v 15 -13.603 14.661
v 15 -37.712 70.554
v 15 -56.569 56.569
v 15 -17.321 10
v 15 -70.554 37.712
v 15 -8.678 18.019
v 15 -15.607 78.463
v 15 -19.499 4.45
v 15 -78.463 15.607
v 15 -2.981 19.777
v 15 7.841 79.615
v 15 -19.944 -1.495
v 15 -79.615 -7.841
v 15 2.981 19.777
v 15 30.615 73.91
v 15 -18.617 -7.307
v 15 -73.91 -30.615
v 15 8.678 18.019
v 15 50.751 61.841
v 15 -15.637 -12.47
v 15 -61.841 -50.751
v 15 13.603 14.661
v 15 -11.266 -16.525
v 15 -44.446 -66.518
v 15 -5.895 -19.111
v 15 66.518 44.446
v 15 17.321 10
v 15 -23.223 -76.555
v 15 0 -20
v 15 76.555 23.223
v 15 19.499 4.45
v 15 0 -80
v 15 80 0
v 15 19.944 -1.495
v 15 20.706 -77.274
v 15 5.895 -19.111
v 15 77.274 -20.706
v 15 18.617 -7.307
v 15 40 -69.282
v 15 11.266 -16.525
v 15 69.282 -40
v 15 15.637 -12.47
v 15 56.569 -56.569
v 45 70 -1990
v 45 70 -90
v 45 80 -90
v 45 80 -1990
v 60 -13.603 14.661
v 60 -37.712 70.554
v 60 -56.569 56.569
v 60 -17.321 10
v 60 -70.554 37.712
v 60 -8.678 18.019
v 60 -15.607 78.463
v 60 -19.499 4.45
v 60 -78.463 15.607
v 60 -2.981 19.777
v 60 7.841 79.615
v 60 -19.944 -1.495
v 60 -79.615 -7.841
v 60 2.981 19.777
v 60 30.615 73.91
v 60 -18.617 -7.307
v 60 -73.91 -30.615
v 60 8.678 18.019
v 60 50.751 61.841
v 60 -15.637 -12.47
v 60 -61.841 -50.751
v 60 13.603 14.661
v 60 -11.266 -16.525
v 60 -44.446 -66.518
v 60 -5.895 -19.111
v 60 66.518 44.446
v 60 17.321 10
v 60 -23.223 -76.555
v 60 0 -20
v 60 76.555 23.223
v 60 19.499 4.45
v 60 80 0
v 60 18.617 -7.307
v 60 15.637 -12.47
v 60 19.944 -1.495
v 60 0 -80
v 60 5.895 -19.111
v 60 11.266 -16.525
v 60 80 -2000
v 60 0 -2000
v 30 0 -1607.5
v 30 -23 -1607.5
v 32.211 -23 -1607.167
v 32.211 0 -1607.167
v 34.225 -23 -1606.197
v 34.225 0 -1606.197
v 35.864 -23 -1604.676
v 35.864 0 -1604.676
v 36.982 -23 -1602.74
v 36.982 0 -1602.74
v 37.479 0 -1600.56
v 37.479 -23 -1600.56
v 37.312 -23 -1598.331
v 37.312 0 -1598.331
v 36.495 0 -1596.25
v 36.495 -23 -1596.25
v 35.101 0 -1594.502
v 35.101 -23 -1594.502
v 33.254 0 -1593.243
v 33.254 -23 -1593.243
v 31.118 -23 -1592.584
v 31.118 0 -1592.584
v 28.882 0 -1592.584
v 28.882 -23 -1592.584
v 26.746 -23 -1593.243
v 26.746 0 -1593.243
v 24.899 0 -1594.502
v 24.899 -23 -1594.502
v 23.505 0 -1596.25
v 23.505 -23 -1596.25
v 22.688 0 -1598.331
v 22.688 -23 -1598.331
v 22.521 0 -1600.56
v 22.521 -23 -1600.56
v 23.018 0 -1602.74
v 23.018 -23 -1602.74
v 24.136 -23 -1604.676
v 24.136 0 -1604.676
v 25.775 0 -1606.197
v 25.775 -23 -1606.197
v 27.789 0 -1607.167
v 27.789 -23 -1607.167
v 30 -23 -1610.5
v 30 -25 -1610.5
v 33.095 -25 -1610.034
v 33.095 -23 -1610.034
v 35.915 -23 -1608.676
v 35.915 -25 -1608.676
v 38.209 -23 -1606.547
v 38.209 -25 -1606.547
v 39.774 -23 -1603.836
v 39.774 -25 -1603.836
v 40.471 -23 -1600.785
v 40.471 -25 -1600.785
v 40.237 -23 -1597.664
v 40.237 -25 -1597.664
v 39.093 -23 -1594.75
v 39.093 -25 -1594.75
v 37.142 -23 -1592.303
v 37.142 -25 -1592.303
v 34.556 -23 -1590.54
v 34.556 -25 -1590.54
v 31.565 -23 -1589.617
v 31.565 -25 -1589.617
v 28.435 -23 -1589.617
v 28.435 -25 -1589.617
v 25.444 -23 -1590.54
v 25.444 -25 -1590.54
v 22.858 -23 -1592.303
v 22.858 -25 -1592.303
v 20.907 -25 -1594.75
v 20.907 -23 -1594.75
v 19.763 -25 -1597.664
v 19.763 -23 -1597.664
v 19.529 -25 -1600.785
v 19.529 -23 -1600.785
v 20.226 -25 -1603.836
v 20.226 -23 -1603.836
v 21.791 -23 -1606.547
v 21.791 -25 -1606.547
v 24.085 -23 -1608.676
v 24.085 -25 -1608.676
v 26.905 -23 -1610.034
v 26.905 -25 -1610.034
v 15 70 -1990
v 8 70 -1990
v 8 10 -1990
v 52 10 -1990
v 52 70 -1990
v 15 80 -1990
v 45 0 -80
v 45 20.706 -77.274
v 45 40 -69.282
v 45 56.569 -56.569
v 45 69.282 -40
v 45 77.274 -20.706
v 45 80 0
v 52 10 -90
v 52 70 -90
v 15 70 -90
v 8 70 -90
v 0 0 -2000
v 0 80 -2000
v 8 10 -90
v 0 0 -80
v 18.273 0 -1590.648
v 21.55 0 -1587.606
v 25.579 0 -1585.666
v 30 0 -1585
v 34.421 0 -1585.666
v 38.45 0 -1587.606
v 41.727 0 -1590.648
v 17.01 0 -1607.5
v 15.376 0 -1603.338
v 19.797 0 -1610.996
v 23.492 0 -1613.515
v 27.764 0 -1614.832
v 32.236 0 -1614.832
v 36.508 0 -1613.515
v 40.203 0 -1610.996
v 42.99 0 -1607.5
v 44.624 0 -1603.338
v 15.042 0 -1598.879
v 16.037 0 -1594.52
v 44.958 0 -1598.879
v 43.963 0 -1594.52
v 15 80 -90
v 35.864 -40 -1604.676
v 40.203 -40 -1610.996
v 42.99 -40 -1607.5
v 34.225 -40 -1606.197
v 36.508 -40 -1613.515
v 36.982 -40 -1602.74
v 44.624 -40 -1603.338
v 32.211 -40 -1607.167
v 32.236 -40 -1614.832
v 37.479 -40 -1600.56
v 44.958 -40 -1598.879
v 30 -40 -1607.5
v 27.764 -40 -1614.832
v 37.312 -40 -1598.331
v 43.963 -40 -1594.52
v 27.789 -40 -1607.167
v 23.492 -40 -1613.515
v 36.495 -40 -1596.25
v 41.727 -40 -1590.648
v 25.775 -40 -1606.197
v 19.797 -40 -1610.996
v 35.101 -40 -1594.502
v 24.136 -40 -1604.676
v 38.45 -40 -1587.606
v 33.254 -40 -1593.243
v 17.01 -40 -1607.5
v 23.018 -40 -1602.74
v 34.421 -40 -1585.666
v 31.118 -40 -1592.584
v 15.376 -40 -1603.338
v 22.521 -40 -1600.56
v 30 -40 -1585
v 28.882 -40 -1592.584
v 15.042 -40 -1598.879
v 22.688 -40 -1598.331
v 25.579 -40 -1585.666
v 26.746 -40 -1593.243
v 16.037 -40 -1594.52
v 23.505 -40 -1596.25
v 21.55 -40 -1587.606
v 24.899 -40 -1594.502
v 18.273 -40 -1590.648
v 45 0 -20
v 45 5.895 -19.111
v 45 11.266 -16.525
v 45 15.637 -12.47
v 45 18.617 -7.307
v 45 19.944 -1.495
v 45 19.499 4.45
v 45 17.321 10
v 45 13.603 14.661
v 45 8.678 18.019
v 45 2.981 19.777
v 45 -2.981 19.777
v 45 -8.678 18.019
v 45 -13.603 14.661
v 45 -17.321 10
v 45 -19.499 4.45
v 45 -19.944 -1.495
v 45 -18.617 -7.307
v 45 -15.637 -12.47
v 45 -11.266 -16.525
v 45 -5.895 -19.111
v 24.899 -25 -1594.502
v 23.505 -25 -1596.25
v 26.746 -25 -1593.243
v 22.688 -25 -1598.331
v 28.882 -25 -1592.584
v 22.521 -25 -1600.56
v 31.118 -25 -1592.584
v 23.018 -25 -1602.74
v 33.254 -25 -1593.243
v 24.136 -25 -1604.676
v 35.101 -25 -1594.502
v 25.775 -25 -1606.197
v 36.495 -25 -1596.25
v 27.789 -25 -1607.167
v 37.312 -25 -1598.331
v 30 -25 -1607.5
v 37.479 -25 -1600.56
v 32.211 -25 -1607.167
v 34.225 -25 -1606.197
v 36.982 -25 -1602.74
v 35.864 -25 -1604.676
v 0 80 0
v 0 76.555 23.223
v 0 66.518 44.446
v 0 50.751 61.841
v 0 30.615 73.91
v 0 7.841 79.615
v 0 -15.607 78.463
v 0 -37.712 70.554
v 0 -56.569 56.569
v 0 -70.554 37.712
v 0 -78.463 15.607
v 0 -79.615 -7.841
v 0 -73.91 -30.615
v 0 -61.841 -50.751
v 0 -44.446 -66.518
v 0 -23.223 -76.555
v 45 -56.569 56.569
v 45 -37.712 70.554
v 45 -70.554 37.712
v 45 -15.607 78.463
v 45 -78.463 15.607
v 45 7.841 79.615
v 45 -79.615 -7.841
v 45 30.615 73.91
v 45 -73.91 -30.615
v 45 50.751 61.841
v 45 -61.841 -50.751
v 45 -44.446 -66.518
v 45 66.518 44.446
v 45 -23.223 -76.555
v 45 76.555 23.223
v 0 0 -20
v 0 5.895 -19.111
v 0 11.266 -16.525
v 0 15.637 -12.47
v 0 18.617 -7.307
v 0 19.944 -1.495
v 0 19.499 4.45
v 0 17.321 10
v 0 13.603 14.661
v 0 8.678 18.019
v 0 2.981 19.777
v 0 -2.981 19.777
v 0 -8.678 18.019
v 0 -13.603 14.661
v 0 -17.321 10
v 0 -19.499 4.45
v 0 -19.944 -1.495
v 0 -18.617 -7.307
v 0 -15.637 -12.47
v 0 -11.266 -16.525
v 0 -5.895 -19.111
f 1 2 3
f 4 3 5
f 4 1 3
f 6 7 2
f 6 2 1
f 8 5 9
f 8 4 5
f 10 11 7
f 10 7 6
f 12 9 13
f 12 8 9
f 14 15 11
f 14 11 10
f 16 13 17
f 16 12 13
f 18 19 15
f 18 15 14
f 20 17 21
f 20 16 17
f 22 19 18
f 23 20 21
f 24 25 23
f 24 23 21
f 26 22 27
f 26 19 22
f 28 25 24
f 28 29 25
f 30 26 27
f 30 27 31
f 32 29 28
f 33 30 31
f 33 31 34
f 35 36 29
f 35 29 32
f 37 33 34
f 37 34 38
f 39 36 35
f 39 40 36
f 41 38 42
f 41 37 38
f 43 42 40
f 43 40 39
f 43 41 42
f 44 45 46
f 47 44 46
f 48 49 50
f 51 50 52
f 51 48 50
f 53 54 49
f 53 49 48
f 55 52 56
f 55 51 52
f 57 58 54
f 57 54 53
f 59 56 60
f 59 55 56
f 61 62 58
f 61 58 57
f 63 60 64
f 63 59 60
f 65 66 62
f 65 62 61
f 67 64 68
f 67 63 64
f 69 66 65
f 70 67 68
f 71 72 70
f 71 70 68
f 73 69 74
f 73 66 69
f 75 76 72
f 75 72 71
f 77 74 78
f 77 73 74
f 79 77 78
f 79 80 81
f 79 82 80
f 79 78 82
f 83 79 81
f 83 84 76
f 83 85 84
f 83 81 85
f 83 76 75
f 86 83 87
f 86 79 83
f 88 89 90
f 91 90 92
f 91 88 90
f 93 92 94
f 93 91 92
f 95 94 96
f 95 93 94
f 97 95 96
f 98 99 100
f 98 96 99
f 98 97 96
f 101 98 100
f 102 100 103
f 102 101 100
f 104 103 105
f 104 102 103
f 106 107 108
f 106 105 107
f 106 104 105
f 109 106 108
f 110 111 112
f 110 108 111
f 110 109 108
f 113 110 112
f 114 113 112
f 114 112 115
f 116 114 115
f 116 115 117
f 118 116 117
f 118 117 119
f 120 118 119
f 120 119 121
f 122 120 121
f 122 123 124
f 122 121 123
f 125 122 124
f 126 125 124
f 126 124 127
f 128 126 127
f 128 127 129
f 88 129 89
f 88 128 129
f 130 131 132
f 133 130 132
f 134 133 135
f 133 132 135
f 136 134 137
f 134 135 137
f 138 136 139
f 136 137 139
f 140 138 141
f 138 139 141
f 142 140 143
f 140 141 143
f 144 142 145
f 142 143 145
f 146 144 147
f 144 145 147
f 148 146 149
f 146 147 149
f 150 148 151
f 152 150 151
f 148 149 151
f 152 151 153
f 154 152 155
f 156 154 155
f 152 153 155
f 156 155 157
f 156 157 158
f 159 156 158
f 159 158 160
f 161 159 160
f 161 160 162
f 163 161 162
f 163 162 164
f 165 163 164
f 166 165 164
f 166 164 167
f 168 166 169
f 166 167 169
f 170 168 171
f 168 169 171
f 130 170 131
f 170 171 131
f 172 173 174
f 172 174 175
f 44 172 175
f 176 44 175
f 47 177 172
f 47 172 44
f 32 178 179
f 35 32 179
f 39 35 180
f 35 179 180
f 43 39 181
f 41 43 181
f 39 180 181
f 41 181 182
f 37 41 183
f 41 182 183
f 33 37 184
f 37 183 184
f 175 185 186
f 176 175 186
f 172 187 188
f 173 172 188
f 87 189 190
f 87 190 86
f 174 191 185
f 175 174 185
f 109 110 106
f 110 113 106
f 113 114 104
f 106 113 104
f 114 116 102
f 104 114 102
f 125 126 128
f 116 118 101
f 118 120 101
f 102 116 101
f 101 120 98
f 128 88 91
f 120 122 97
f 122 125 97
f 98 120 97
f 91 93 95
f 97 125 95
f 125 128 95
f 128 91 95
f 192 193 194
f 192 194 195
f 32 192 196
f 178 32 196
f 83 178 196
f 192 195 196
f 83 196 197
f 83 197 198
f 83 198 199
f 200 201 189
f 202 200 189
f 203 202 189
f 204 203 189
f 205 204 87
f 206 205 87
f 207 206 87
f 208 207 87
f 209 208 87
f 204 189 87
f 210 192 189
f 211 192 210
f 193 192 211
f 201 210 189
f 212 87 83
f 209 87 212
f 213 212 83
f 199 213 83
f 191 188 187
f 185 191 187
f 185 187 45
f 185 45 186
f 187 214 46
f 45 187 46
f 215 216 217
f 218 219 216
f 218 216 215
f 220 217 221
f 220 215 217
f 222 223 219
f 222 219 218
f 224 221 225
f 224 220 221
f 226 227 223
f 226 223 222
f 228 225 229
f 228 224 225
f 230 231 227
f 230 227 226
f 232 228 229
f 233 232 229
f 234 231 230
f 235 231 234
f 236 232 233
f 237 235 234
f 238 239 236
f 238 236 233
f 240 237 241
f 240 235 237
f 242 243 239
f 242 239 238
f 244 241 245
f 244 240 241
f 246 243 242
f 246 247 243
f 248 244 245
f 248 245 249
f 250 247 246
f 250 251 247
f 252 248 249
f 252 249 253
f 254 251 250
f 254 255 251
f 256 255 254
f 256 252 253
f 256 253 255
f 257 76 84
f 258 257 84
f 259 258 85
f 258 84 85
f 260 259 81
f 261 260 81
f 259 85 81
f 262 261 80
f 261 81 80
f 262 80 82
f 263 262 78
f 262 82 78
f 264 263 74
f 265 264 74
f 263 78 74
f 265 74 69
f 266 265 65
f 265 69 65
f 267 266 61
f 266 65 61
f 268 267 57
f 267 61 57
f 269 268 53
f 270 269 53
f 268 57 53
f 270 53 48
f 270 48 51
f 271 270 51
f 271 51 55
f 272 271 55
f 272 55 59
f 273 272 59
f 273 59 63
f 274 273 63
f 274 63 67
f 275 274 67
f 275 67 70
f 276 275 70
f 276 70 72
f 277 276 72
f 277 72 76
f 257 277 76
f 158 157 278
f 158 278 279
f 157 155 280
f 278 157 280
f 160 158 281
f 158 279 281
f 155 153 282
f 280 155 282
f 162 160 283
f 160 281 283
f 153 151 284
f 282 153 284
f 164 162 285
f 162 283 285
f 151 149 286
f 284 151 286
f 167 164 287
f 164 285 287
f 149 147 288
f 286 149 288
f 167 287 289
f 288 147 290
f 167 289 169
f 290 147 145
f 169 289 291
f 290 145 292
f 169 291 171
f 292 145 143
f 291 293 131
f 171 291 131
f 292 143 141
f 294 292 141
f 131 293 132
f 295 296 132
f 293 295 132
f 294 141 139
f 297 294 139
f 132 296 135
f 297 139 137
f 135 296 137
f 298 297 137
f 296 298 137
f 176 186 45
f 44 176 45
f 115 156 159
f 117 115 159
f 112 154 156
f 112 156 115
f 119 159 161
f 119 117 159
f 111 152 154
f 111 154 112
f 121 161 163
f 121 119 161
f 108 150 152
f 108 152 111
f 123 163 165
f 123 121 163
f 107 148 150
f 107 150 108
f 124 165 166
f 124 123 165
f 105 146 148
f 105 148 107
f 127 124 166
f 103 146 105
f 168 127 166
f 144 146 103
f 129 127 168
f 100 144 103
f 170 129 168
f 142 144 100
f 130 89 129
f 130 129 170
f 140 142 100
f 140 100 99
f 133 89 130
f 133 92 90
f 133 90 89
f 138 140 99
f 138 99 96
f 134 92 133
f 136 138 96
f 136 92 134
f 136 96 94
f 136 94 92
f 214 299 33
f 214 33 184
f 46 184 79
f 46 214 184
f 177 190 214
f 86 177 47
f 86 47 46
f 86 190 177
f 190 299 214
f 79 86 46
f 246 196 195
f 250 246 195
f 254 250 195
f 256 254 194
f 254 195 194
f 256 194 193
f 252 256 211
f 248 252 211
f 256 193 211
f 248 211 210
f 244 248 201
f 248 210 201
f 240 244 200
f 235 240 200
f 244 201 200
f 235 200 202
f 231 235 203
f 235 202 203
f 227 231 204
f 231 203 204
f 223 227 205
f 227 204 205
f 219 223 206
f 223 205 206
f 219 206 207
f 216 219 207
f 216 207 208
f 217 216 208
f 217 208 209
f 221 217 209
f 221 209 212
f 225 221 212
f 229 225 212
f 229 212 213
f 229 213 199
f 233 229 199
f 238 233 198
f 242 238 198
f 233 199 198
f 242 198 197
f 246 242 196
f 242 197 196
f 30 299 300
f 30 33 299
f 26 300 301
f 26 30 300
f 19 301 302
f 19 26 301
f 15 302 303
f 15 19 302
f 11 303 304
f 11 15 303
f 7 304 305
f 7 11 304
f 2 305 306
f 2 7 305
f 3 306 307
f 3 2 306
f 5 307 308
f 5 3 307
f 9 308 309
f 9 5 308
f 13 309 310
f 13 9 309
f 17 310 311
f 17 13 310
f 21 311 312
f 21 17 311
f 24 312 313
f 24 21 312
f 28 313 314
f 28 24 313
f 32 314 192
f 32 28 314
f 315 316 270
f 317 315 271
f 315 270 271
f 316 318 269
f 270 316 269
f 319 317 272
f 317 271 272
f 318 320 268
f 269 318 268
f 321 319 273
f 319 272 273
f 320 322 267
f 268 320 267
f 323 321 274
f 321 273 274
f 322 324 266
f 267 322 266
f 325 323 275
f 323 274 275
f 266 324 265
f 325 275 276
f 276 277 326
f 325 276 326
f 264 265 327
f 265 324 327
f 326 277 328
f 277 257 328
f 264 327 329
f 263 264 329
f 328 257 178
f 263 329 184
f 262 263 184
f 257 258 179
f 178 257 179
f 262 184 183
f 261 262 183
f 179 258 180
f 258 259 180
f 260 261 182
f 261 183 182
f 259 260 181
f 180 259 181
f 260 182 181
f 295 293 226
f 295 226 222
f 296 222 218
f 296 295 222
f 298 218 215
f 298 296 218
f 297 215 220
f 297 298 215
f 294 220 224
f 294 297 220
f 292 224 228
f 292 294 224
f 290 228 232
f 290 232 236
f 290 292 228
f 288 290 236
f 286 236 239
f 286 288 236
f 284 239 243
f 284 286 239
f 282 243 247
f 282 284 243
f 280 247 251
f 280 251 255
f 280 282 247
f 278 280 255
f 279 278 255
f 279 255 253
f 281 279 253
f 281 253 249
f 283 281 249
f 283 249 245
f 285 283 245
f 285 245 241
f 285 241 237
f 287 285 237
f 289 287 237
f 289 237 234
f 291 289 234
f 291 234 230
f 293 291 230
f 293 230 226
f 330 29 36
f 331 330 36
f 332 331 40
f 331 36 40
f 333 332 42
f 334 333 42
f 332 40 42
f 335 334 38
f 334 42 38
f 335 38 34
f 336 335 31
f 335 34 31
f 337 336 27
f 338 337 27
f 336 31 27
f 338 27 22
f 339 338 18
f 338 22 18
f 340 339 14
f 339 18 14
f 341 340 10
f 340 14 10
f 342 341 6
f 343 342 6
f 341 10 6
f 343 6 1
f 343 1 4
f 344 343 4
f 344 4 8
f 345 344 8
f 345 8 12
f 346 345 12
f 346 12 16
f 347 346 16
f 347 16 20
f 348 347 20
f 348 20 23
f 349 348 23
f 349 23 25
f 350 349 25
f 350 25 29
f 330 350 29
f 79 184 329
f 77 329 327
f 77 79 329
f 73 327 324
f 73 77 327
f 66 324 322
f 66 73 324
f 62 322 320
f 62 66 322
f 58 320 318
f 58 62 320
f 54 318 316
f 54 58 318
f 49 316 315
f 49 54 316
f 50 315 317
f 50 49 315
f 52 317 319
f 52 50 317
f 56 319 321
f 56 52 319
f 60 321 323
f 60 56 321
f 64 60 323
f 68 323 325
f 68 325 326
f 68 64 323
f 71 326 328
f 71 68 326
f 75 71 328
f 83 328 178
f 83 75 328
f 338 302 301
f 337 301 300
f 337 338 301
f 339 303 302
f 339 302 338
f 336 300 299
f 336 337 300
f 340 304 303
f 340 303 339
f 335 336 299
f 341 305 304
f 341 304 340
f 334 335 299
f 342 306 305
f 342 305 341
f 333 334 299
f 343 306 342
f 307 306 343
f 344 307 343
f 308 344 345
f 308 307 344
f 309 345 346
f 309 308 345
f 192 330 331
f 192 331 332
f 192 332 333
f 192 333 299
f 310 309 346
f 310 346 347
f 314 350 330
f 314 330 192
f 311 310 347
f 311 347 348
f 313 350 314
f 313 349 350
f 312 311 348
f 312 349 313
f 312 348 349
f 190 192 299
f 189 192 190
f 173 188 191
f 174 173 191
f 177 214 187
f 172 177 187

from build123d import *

# Parameters (mm, degrees)
SKETCH1_W           = 60
SKETCH1_H           = 2000
BOSS_EXTRUDE1_DEPTH = 80
CUT_EXTRUDE1_START  = -90
CUT_EXTRUDE1_DEPTH  = 1900
SKETCH3_R           = 80
BOSS_EXTRUDE2_DEPTH = 60
CUT_EXTRUDE2_START  = -15
SKETCH3_2_R         = 80
CUT_EXTRUDE2_DEPTH  = 30
CUT_EXTRUDE3_REACH  = 2004.498
SKETCH4_R           = 20
SKETCH5_R           = 15
SKETCH5_R_2         = 7.5
BOSS_EXTRUDE3_DEPTH = 40
CUT_EXTRUDE4_START  = -15
SKETCH6_R           = 10.5
CUT_EXTRUDE4_DEPTH  = 2


with BuildPart() as part:
    # Sketch1 → Boss-Extrude1 (new body)
    with BuildSketch(Plane(origin=(0, 0, 0), x_dir=(1, 0, 0), z_dir=(0, 1, 0))):
        with Locations((30, 1000)):
            Rectangle(SKETCH1_W, SKETCH1_H)
    extrude(amount=BOSS_EXTRUDE1_DEPTH)

    # Sketch2 → Cut-Extrude1 (cut)
    with BuildSketch(Plane.XY.offset(CUT_EXTRUDE1_START)):
        Polygon((15, 80), (15, 70), (8, 70), (8, 10), (52, 10), (52, 70), (45, 70), (45, 80), align=None)
    extrude(amount=-CUT_EXTRUDE1_DEPTH, mode=Mode.SUBTRACT)

    # Sketch3 → Boss-Extrude2 (add)
    with BuildSketch(Plane(origin=(60, 0, 0), x_dir=(0, 0, -1), z_dir=(1, 0, 0))):
        Circle(SKETCH3_R)
    extrude(amount=-BOSS_EXTRUDE2_DEPTH)

    # Sketch3<2> → Cut-Extrude2 (cut)
    with BuildSketch(Plane(origin=(60, 0, 0), x_dir=(0, 0, -1), z_dir=(1, 0, 0)).offset(CUT_EXTRUDE2_START)):
        Circle(SKETCH3_2_R)
    extrude(amount=-CUT_EXTRUDE2_DEPTH, mode=Mode.SUBTRACT)

    # Cut-Extrude3: up to this face of the body (flat: up to its plane)
    cut_extrude3_end = Plane(part.part.faces().sort_by_distance((0, 35.579997564, -912.895006003))[0])
    # Sketch4 → Cut-Extrude3 (cut, up to the picked face)
    with BuildSketch(Plane(origin=(60, 0, 0), x_dir=(0, 0, -1), z_dir=(1, 0, 0)), mode=Mode.PRIVATE) as cut_extrude3_sk1:
        Circle(SKETCH4_R)
    cut_extrude3_tool1 = split(extrude(cut_extrude3_sk1.sketch, amount=-CUT_EXTRUDE3_REACH, mode=Mode.PRIVATE), bisect_by=cut_extrude3_end, keep=Keep.BOTH, mode=Mode.PRIVATE)
    add(cut_extrude3_tool1.solids().sort_by(Axis((60, 0, 0), (-1, 0, 0)))[0], mode=Mode.SUBTRACT)

    # Sketch5 → Boss-Extrude3 (add)
    with BuildSketch(Plane.XZ):
        with Locations(Location((30, -1600, 0), (0, 0, 90))):
            Circle(SKETCH5_R)
        with Locations(Location((30, -1600, 0), (0, 0, 270))):
            Circle(SKETCH5_R_2, mode=Mode.SUBTRACT)
    extrude(amount=BOSS_EXTRUDE3_DEPTH)

    # Sketch6 → Cut-Extrude4 (cut)
    with BuildSketch(Plane.XZ.offset(40).offset(CUT_EXTRUDE4_START)):
        with Locations(Location((30, -1600, 0), (0, 0, 270))):
            Circle(SKETCH6_R)
    extrude(amount=-CUT_EXTRUDE4_DEPTH, mode=Mode.SUBTRACT)


solid = part.part
